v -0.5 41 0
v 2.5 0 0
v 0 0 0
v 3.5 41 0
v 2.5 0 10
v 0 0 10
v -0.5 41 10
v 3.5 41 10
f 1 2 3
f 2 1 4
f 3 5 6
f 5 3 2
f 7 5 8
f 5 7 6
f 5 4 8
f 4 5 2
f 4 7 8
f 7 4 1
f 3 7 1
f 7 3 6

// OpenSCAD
fit = 1 / 2;
length = 41;
CubePoints = [
  [  0,  0,  0 ],  //0
  [ 3 - fit,  0,  0 ],  //1
  [ 4 - fit,  length,  0 ],  //2
  [  -1 + fit,  length,  0 ],  //3
  [  0,  0,  10 ],  //4
  [ 3 - fit,  0,  10 ],  //5
  [ 4 - fit,  length,  10 ],  //6
  [  -1 + fit,  length,  10 ]]; //7
  
CubeFaces = [
  [0,1,2,3],  // bottom
  [4,5,1,0],  // front
  [7,6,5,4],  // top
  [5,6,2,1],  // right
  [6,7,3,2],  // back
  [7,4,0,3]]; // left
  
  polyhedron( CubePoints, CubeFaces);
